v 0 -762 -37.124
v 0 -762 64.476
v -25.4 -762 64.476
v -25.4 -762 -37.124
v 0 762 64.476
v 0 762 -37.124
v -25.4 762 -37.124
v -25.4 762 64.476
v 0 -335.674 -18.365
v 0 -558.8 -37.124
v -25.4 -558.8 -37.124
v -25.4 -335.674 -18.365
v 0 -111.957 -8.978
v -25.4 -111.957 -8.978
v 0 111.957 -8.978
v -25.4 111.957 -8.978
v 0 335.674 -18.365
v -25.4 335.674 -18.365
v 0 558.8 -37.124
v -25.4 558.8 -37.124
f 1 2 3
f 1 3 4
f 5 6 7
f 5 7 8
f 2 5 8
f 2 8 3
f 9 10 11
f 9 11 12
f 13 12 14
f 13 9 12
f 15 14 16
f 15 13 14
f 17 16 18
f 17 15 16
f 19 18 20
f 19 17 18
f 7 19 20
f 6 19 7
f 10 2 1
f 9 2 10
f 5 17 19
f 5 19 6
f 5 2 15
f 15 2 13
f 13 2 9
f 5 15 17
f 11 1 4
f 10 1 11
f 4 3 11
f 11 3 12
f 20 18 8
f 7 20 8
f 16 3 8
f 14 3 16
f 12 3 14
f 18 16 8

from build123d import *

# Parameters (mm, degrees)
F1_DEPTH = 25.4


with BuildPart() as f1:
    # F0 (on Right) → F1 (new body)
    with BuildSketch(Plane.YZ):
        with BuildLine():
            Line((762, 64.476146), (-762, 64.476146))
            Line((-762, 64.476146), (-762, -37.123854))
            Line((-762, -37.123854), (-558.8, -37.123854))
            ThreePointArc((-558.8, -37.123854), (0, -7.803793), (558.8, -37.123854))
            Line((558.8, -37.123854), (762, -37.123854))
            Line((762, -37.123854), (762, 64.476146))
        make_face()
    extrude(amount=-F1_DEPTH)


solid = f1.part
